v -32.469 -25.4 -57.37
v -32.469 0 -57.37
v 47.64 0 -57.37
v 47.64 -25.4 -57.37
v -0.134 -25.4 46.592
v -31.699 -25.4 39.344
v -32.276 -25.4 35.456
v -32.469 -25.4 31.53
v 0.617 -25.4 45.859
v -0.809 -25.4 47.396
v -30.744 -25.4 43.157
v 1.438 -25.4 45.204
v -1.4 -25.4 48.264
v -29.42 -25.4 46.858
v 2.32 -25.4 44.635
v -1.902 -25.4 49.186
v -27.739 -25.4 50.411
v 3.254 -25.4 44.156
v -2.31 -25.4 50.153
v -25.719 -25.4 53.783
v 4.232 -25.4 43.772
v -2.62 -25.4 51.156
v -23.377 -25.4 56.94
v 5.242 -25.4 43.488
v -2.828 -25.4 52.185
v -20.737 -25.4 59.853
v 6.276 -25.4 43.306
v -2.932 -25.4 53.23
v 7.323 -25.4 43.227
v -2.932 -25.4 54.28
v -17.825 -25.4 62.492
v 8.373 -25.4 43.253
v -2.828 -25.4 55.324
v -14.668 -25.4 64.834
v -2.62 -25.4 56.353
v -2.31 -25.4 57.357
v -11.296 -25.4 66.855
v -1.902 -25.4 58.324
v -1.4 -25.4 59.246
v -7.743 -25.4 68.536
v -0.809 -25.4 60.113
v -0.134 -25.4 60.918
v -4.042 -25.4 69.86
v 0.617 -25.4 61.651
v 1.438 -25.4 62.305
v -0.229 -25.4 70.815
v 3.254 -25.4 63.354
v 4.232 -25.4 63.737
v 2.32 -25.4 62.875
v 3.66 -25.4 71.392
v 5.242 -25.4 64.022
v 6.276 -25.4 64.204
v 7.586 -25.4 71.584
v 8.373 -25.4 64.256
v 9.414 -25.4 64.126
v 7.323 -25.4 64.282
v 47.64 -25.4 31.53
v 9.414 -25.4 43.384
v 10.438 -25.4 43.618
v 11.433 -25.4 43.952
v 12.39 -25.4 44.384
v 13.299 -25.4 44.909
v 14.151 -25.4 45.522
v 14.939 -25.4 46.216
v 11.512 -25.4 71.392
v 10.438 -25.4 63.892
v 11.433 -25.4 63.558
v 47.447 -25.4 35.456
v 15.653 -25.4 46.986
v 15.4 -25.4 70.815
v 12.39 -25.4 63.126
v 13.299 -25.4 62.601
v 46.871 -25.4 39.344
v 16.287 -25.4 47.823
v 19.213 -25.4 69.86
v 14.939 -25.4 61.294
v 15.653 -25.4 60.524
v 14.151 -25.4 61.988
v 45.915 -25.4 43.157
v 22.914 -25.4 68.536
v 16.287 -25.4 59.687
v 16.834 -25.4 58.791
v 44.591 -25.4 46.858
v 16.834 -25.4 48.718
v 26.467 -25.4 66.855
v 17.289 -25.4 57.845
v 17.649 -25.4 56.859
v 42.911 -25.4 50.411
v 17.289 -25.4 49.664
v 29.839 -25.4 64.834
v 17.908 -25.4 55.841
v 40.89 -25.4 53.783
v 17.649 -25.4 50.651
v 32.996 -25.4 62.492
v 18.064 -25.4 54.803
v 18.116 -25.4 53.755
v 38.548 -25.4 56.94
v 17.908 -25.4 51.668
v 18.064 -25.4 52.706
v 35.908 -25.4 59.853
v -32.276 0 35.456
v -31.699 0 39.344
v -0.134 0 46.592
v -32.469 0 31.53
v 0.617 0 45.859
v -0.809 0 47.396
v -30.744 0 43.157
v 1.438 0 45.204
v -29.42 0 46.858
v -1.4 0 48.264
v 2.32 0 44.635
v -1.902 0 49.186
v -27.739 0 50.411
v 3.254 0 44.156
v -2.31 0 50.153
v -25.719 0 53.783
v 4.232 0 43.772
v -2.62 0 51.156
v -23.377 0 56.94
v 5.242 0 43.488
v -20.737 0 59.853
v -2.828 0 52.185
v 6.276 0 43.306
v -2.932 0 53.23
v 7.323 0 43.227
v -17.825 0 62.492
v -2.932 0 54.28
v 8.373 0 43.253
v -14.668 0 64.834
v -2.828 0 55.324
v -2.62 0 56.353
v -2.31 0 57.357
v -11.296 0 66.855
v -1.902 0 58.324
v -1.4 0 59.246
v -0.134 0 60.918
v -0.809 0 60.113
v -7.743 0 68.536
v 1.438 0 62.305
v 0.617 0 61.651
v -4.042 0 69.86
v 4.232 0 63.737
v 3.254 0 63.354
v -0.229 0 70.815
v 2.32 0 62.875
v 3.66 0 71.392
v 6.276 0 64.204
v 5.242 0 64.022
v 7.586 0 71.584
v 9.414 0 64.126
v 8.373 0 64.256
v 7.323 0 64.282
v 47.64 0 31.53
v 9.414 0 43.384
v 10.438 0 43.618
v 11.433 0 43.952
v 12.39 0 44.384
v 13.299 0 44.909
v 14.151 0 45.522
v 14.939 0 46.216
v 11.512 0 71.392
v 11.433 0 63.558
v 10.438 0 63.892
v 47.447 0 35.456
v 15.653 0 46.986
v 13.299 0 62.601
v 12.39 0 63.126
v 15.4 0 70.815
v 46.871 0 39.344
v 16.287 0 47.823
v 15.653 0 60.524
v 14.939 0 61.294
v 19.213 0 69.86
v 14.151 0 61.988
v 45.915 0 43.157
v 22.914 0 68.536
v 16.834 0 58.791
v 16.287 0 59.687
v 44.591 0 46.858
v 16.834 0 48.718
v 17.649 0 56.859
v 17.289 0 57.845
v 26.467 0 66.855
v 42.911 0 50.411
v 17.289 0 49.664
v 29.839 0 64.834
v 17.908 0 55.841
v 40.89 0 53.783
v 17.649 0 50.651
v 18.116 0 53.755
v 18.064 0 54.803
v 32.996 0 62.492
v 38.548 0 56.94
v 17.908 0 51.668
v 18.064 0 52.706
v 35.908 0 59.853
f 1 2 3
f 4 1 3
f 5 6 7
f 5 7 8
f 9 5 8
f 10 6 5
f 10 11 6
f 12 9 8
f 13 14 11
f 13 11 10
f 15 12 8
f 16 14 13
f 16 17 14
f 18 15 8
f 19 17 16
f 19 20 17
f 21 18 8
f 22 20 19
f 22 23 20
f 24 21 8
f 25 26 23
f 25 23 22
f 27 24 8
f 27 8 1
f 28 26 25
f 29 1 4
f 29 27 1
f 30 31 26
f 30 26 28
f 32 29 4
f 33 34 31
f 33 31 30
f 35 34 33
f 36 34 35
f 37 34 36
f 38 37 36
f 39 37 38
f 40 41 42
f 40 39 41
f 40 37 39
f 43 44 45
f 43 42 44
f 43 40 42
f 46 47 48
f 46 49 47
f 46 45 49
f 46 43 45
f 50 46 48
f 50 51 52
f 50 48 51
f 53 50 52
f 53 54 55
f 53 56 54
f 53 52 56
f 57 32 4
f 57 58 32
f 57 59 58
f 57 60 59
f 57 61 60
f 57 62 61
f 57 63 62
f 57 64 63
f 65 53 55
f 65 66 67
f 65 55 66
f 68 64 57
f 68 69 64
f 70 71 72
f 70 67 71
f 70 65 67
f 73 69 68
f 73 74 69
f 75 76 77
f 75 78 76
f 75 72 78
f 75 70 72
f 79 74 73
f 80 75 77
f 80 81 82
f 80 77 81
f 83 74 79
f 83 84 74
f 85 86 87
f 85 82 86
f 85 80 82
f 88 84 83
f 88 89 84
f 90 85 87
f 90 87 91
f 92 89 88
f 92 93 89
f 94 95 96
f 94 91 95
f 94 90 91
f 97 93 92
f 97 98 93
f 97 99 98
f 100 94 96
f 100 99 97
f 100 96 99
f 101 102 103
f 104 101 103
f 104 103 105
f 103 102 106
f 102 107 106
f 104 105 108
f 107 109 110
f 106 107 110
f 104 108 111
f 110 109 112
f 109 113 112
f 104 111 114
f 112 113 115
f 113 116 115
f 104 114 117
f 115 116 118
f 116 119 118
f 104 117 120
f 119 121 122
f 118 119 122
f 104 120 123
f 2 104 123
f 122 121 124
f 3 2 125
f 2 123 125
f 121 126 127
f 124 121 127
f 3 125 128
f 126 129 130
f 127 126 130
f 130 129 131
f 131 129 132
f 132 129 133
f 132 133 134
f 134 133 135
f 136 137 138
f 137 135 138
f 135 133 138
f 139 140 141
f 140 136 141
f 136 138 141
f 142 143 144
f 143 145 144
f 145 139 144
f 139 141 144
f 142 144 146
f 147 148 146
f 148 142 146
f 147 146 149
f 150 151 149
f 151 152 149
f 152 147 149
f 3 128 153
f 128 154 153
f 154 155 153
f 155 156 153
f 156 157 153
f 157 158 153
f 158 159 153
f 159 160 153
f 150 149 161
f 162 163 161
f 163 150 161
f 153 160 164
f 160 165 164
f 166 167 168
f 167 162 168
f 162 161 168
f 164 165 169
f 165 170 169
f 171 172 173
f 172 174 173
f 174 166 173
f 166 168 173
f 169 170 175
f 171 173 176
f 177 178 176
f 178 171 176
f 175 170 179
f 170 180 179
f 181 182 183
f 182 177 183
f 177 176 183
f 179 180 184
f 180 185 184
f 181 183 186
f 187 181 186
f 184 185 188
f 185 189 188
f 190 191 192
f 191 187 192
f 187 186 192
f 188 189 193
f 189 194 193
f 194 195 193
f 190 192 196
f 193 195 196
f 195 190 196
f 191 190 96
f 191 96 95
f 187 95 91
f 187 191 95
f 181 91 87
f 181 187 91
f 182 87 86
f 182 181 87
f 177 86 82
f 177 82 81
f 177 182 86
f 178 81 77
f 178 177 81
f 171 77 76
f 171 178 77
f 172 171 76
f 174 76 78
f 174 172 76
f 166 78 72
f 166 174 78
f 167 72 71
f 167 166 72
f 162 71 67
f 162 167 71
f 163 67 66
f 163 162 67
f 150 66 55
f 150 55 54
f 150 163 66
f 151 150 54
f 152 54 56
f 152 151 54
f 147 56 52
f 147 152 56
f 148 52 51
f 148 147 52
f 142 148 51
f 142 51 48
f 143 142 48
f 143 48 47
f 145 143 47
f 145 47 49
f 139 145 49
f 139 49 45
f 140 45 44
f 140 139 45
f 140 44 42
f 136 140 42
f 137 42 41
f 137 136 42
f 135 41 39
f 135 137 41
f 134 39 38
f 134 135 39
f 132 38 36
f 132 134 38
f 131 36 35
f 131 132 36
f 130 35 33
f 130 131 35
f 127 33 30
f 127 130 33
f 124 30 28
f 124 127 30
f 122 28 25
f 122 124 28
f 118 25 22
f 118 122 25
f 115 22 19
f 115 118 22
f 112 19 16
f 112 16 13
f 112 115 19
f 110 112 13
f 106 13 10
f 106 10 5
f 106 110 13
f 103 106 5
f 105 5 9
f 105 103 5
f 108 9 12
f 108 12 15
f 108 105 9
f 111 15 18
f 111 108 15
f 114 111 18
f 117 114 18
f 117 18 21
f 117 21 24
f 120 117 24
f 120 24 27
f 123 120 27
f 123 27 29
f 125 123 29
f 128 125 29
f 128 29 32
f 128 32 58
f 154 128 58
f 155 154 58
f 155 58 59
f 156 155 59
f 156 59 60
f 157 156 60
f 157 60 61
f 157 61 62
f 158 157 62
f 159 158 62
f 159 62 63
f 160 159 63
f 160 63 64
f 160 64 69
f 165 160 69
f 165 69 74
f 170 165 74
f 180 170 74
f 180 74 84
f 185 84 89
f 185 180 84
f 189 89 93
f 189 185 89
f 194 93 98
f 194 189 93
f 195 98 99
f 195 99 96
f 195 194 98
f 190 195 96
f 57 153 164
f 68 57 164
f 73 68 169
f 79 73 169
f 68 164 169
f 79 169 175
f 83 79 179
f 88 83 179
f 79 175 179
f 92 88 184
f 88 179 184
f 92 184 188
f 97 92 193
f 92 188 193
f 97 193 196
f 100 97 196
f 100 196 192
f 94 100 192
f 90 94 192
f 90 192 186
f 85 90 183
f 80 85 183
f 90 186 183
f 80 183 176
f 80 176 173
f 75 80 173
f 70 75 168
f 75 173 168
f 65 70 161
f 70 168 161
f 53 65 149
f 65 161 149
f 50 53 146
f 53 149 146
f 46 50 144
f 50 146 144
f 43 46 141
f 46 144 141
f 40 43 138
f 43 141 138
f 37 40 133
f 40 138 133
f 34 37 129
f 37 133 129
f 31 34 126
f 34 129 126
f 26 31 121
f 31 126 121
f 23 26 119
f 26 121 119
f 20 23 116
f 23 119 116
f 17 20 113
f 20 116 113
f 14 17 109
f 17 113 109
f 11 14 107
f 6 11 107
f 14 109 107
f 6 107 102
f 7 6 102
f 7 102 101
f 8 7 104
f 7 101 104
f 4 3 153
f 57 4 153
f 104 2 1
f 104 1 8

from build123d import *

# Parameters (mm, degrees)
F0_R     = 10.530807
F0_W     = 80.109231
F0_H     = 88.9
F1_DEPTH = 25.4


with BuildPart() as f1:
    # F0 (on Front) → F1 (new body)
    with BuildSketch(Plane.XZ):
        with BuildLine():
            ThreePointArc((47.640182, 31.529863), (7.585566, 71.584478), (-32.469049, 31.529863))
            Line((-32.469049, 31.529863), (47.640182, 31.529863))
        make_face()
        with Locations((7.585566, 53.75486)):
            Circle(F0_R, mode=Mode.SUBTRACT)
        with Locations((7.585566, -12.920137)):
            Rectangle(F0_W, F0_H)
    extrude(amount=F1_DEPTH)


solid = f1.part
